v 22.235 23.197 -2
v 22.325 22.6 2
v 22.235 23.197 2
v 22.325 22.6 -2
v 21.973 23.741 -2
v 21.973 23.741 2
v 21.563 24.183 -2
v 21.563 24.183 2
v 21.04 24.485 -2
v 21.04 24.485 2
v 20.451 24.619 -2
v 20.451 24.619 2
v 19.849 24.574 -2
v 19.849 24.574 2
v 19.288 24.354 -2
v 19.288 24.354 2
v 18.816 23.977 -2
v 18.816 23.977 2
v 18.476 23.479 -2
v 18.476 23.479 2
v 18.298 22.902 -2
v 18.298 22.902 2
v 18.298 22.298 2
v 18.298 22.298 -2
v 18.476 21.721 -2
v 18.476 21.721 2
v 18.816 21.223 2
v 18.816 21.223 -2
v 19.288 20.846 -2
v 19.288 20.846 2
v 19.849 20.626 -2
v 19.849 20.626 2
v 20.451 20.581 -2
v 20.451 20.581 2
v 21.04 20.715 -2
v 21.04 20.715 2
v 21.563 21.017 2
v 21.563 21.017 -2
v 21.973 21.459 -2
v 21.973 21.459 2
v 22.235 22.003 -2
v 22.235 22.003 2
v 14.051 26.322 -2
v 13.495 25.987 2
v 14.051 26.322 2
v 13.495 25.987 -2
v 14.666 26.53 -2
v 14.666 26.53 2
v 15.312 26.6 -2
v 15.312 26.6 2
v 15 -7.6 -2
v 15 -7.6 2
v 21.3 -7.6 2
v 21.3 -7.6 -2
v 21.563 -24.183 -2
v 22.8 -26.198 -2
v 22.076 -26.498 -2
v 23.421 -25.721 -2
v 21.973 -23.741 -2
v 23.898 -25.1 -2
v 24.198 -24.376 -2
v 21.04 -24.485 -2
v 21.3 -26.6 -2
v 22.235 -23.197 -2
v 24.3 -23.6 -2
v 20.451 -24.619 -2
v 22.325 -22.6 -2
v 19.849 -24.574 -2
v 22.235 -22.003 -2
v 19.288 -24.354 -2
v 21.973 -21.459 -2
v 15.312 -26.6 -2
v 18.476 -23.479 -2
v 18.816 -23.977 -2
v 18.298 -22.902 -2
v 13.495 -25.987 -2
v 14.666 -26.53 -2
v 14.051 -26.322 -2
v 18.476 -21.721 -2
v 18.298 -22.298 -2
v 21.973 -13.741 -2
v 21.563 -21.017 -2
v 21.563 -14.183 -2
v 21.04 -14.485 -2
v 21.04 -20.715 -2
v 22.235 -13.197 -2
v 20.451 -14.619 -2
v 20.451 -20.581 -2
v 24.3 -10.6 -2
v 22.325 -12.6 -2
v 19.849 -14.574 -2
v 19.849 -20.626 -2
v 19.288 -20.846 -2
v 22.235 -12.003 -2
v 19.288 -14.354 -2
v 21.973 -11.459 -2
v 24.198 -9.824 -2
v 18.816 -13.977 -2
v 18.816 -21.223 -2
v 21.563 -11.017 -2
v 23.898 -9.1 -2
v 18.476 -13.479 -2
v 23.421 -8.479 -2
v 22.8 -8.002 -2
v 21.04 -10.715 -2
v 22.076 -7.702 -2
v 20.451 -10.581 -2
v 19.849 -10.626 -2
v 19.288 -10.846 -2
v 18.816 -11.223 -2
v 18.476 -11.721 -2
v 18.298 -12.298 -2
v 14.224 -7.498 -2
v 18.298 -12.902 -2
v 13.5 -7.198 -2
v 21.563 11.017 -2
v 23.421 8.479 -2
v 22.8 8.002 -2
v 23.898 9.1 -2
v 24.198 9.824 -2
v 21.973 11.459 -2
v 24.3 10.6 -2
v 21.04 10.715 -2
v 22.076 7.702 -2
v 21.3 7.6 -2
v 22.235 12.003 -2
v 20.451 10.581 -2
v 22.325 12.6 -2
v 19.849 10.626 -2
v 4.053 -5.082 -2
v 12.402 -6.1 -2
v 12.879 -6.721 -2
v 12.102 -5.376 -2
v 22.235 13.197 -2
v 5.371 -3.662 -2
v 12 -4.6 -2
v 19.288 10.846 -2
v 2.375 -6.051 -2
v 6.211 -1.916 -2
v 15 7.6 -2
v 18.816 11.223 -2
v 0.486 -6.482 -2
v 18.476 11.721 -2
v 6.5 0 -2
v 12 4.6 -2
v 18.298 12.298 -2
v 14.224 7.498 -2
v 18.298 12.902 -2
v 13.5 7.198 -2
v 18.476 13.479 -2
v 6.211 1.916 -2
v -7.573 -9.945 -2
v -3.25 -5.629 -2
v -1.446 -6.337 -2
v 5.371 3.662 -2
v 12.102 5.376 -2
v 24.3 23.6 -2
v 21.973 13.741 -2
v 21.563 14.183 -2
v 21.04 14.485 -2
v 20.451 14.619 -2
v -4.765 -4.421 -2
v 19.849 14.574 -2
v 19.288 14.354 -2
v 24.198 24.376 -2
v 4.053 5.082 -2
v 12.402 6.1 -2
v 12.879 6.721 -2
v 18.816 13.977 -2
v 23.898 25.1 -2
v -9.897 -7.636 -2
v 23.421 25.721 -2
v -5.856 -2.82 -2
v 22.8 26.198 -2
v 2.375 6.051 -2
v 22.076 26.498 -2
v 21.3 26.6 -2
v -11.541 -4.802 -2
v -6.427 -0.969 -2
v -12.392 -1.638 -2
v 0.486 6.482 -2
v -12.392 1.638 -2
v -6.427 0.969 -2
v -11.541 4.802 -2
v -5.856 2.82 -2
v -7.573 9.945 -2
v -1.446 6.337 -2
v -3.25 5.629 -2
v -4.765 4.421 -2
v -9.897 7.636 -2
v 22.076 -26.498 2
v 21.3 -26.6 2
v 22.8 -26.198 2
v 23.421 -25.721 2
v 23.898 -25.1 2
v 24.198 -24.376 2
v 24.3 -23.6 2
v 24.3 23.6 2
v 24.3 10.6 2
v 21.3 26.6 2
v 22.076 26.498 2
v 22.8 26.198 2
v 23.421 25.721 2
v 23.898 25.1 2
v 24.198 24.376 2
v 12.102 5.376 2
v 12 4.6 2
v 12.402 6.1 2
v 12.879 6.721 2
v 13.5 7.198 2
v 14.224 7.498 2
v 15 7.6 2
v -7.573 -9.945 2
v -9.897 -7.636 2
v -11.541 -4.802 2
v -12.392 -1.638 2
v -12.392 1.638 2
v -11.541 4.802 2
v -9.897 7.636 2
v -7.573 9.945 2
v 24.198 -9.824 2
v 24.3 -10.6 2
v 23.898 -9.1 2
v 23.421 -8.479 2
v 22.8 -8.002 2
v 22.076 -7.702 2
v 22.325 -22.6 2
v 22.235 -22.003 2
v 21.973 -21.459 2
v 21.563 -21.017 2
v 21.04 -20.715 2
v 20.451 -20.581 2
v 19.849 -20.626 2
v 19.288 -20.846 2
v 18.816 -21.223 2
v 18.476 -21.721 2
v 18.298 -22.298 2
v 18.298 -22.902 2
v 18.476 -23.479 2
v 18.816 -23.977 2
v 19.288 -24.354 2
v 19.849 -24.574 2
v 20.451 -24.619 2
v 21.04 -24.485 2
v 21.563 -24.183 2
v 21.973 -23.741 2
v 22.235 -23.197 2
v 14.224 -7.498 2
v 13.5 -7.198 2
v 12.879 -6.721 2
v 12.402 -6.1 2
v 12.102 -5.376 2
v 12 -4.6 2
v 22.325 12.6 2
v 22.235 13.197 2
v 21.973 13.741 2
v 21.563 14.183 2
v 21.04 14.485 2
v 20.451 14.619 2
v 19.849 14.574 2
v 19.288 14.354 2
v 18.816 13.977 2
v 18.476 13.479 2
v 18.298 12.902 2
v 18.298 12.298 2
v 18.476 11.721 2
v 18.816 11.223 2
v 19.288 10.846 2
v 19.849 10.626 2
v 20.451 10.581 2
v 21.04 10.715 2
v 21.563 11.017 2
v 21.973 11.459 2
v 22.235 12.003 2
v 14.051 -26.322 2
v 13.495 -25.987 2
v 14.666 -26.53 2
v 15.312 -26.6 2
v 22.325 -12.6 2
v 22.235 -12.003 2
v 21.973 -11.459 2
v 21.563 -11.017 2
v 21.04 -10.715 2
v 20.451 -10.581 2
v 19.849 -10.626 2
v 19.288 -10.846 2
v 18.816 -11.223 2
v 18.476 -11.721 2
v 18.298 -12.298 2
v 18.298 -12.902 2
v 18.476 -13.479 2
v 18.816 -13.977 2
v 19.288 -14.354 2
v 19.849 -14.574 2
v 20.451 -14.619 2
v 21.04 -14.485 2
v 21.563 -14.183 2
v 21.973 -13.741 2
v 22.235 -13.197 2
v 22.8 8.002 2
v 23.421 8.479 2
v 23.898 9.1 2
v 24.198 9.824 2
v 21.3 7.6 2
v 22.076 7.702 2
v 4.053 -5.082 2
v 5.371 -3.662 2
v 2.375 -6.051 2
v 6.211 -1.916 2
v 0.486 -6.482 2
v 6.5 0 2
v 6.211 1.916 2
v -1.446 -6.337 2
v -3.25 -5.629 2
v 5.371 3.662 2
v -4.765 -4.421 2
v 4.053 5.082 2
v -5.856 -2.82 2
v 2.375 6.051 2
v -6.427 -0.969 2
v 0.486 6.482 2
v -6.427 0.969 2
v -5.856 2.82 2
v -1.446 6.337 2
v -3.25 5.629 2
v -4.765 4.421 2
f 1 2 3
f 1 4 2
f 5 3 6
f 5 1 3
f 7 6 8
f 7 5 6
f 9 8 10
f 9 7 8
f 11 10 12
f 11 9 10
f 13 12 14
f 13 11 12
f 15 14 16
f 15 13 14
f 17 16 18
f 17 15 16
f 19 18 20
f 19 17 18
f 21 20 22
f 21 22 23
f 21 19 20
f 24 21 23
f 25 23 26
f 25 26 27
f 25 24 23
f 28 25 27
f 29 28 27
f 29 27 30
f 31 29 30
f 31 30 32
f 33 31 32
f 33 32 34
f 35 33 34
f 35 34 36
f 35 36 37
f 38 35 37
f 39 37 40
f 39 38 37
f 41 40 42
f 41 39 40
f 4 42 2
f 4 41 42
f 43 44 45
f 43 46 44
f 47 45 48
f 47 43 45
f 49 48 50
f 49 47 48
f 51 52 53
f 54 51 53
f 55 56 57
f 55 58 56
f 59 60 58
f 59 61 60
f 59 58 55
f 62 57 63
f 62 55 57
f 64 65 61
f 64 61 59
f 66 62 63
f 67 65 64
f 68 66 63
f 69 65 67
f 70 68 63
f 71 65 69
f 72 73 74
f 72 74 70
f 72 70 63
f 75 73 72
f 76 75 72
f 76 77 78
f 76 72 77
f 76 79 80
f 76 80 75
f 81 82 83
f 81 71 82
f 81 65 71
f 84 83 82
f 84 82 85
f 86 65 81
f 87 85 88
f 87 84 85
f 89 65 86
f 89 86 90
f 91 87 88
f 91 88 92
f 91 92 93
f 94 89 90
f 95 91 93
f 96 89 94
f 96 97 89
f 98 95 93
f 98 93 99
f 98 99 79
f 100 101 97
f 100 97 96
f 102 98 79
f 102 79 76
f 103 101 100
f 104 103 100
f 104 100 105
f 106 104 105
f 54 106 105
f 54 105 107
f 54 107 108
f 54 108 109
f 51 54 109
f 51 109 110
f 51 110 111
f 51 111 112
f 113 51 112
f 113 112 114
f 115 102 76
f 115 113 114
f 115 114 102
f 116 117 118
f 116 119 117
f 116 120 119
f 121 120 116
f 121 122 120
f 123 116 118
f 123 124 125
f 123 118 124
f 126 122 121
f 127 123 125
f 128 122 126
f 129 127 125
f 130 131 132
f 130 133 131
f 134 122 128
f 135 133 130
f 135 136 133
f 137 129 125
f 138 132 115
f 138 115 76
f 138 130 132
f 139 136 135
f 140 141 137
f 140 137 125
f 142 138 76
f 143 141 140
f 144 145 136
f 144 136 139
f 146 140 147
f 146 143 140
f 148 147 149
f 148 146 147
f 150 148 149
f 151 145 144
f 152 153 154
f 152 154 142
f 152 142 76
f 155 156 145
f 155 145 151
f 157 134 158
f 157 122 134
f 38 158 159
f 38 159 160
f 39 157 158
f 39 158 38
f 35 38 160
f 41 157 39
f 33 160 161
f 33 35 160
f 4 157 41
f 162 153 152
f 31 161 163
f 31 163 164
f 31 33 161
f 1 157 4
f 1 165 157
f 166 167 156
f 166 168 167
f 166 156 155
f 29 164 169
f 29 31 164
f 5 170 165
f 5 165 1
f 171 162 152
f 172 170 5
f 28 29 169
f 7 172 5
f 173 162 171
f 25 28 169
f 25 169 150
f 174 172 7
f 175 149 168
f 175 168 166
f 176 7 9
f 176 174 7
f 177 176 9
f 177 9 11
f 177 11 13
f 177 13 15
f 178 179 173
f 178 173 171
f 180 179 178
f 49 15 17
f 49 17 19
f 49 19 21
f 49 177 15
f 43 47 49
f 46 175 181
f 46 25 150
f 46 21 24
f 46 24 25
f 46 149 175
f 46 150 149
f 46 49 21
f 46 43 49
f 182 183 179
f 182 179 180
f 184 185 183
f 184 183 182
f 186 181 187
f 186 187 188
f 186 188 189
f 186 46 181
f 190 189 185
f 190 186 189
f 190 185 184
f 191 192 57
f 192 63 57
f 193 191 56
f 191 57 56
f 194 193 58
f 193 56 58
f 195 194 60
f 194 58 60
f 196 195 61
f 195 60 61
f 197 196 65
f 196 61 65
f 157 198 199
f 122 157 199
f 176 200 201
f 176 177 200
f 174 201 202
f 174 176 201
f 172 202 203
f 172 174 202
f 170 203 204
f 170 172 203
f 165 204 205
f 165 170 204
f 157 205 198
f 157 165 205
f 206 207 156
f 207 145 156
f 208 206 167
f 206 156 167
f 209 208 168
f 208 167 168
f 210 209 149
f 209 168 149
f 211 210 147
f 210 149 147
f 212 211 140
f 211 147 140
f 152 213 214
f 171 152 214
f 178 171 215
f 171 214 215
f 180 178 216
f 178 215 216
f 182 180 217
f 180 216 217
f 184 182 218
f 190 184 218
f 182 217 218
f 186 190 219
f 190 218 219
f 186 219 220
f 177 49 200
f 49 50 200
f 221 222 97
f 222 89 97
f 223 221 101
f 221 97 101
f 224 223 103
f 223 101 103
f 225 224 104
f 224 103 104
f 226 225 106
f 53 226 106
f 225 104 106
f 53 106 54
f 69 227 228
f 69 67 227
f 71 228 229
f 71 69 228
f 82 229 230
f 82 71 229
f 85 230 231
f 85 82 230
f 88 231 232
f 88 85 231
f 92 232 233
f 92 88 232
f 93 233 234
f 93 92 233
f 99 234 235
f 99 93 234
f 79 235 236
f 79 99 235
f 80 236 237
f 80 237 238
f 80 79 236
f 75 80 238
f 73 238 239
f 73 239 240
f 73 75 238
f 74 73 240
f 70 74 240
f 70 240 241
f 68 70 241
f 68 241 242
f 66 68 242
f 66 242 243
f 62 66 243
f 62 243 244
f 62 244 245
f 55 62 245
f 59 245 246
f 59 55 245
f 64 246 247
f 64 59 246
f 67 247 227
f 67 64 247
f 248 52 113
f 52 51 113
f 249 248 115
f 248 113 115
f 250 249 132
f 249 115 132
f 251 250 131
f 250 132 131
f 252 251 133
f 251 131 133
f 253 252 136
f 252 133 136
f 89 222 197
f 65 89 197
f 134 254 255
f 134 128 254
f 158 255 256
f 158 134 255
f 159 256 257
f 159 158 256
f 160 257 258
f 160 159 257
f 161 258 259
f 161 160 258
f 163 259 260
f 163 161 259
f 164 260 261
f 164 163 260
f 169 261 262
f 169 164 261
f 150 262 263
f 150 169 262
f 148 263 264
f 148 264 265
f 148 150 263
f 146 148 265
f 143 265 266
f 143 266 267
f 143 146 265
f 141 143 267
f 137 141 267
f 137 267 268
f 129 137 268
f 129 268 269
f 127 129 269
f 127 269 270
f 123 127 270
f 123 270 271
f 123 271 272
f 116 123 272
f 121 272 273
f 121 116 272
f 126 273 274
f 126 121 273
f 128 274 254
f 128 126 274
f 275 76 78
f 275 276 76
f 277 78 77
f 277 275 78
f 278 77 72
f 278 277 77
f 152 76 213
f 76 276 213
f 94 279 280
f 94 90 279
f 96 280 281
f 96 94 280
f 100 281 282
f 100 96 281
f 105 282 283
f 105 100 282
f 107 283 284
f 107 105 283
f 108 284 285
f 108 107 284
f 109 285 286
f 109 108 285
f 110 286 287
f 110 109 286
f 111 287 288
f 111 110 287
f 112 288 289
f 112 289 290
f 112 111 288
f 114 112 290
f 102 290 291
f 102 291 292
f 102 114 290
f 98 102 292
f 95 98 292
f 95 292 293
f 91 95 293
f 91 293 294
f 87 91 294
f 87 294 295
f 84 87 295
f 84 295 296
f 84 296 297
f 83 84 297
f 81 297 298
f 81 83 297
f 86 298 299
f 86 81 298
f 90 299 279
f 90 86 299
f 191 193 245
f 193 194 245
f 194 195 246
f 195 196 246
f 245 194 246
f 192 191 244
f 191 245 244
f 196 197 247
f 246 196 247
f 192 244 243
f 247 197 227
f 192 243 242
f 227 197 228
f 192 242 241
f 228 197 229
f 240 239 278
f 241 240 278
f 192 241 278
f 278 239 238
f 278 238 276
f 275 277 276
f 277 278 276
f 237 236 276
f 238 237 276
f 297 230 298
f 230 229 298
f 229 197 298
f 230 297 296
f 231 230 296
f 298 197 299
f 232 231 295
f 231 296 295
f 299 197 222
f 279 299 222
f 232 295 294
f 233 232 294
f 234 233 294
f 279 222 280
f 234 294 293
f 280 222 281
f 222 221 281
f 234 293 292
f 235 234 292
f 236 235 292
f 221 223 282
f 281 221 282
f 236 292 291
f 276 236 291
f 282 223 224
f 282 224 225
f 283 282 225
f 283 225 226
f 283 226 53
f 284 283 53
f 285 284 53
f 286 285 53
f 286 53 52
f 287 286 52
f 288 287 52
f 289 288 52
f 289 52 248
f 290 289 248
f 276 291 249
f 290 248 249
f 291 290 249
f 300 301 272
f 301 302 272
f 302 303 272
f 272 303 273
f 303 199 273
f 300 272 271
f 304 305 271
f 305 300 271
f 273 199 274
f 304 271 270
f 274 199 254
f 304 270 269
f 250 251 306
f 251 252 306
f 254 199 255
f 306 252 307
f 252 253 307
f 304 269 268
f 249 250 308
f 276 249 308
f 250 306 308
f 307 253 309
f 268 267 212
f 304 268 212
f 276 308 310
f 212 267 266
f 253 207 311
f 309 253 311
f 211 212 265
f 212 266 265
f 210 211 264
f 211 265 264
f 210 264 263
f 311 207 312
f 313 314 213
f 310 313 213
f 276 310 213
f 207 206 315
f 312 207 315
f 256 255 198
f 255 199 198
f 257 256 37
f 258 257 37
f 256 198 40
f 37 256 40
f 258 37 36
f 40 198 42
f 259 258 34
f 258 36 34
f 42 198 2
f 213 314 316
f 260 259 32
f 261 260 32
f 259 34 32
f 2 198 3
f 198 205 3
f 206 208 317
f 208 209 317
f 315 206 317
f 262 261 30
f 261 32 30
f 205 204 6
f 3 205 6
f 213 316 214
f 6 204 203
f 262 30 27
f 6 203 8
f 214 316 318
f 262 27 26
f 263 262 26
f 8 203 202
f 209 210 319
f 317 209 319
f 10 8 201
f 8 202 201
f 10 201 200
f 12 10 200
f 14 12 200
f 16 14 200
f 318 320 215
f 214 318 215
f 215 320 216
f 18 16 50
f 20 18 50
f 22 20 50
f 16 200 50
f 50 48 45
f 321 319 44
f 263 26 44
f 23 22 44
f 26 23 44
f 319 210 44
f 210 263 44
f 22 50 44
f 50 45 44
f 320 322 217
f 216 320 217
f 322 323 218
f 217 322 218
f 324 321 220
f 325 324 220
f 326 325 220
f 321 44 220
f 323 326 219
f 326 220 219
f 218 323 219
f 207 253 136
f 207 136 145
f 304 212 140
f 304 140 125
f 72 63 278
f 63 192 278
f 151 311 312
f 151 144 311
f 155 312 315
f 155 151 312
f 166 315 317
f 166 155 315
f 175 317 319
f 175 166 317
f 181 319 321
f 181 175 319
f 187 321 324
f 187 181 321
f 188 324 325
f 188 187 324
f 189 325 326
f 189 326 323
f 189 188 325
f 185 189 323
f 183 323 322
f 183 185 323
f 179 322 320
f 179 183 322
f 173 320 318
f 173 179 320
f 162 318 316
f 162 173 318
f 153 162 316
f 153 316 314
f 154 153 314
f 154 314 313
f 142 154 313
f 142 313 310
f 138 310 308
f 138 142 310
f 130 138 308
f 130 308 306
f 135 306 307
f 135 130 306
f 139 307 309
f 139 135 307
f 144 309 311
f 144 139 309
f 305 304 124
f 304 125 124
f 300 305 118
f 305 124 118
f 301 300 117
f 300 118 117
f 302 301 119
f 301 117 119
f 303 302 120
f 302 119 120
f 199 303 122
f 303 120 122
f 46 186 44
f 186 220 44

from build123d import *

# Parameters (mm, degrees)
SKETCH_1_R          = 6.5
SKETCH_1_R_2        = 2.025
EXTRUDE_1_DEPTH     = 2
SKETCH_2_W          = 12.3
SKETCH_2_H          = 15.2
CUT_EXTRUDE_1_DEPTH = 10
FILLET_1_R          = 3


with BuildPart() as part:
    # 草图1 → 凸台-拉伸1 (new, symmetric)
    with BuildSketch(Plane.XY):
        with BuildLine():
            Line((-7.572670512, 9.945082268), (14.3, 26.6))
            Line((14.3, 26.6), (24.3, 26.6))
            Line((24.3, 26.6), (24.3, -26.6))
            Line((24.3, -26.6), (14.3, -26.6))
            Line((14.3, -26.6), (-7.572670512, -9.945082268))
            ThreePointArc((-7.572670512, -9.945082268), (-12.5, 0), (-7.572670512, 9.945082268))
        make_face()
        Circle(SKETCH_1_R, mode=Mode.SUBTRACT)
        with Locations((20.3, 22.6)):
            Circle(SKETCH_1_R_2, mode=Mode.SUBTRACT)
        with Locations((20.3, 12.6)):
            Circle(SKETCH_1_R_2, mode=Mode.SUBTRACT)
        with Locations((20.3, -12.6)):
            Circle(SKETCH_1_R_2, mode=Mode.SUBTRACT)
        with Locations((20.3, -22.6)):
            Circle(SKETCH_1_R_2, mode=Mode.SUBTRACT)
    extrude(amount=EXTRUDE_1_DEPTH, both=True)

    # 草图2 → 切除-拉伸1 (cut)
    with BuildSketch(Plane.XY.offset(2)):
        with Locations((18.15, 0)):
            Rectangle(SKETCH_2_W, SKETCH_2_H)
    extrude(amount=-CUT_EXTRUDE_1_DEPTH, mode=Mode.SUBTRACT)

    # 圆角1
    fillet_1_edges = [part.edges().sort_by_distance(p)[0] for p in [
        (24.3, -26.6, 0),
        (14.3, -26.6, 0),
        (14.3, 26.6, 0),
        (24.3, 26.6, 0),
        (24.3, 7.6, 0),
        (24.3, -7.6, 0),
        (12, -7.6, 0),
        (12, 7.6, 0),
    ]]
    fillet(fillet_1_edges, radius=FILLET_1_R)


solid = part.part
